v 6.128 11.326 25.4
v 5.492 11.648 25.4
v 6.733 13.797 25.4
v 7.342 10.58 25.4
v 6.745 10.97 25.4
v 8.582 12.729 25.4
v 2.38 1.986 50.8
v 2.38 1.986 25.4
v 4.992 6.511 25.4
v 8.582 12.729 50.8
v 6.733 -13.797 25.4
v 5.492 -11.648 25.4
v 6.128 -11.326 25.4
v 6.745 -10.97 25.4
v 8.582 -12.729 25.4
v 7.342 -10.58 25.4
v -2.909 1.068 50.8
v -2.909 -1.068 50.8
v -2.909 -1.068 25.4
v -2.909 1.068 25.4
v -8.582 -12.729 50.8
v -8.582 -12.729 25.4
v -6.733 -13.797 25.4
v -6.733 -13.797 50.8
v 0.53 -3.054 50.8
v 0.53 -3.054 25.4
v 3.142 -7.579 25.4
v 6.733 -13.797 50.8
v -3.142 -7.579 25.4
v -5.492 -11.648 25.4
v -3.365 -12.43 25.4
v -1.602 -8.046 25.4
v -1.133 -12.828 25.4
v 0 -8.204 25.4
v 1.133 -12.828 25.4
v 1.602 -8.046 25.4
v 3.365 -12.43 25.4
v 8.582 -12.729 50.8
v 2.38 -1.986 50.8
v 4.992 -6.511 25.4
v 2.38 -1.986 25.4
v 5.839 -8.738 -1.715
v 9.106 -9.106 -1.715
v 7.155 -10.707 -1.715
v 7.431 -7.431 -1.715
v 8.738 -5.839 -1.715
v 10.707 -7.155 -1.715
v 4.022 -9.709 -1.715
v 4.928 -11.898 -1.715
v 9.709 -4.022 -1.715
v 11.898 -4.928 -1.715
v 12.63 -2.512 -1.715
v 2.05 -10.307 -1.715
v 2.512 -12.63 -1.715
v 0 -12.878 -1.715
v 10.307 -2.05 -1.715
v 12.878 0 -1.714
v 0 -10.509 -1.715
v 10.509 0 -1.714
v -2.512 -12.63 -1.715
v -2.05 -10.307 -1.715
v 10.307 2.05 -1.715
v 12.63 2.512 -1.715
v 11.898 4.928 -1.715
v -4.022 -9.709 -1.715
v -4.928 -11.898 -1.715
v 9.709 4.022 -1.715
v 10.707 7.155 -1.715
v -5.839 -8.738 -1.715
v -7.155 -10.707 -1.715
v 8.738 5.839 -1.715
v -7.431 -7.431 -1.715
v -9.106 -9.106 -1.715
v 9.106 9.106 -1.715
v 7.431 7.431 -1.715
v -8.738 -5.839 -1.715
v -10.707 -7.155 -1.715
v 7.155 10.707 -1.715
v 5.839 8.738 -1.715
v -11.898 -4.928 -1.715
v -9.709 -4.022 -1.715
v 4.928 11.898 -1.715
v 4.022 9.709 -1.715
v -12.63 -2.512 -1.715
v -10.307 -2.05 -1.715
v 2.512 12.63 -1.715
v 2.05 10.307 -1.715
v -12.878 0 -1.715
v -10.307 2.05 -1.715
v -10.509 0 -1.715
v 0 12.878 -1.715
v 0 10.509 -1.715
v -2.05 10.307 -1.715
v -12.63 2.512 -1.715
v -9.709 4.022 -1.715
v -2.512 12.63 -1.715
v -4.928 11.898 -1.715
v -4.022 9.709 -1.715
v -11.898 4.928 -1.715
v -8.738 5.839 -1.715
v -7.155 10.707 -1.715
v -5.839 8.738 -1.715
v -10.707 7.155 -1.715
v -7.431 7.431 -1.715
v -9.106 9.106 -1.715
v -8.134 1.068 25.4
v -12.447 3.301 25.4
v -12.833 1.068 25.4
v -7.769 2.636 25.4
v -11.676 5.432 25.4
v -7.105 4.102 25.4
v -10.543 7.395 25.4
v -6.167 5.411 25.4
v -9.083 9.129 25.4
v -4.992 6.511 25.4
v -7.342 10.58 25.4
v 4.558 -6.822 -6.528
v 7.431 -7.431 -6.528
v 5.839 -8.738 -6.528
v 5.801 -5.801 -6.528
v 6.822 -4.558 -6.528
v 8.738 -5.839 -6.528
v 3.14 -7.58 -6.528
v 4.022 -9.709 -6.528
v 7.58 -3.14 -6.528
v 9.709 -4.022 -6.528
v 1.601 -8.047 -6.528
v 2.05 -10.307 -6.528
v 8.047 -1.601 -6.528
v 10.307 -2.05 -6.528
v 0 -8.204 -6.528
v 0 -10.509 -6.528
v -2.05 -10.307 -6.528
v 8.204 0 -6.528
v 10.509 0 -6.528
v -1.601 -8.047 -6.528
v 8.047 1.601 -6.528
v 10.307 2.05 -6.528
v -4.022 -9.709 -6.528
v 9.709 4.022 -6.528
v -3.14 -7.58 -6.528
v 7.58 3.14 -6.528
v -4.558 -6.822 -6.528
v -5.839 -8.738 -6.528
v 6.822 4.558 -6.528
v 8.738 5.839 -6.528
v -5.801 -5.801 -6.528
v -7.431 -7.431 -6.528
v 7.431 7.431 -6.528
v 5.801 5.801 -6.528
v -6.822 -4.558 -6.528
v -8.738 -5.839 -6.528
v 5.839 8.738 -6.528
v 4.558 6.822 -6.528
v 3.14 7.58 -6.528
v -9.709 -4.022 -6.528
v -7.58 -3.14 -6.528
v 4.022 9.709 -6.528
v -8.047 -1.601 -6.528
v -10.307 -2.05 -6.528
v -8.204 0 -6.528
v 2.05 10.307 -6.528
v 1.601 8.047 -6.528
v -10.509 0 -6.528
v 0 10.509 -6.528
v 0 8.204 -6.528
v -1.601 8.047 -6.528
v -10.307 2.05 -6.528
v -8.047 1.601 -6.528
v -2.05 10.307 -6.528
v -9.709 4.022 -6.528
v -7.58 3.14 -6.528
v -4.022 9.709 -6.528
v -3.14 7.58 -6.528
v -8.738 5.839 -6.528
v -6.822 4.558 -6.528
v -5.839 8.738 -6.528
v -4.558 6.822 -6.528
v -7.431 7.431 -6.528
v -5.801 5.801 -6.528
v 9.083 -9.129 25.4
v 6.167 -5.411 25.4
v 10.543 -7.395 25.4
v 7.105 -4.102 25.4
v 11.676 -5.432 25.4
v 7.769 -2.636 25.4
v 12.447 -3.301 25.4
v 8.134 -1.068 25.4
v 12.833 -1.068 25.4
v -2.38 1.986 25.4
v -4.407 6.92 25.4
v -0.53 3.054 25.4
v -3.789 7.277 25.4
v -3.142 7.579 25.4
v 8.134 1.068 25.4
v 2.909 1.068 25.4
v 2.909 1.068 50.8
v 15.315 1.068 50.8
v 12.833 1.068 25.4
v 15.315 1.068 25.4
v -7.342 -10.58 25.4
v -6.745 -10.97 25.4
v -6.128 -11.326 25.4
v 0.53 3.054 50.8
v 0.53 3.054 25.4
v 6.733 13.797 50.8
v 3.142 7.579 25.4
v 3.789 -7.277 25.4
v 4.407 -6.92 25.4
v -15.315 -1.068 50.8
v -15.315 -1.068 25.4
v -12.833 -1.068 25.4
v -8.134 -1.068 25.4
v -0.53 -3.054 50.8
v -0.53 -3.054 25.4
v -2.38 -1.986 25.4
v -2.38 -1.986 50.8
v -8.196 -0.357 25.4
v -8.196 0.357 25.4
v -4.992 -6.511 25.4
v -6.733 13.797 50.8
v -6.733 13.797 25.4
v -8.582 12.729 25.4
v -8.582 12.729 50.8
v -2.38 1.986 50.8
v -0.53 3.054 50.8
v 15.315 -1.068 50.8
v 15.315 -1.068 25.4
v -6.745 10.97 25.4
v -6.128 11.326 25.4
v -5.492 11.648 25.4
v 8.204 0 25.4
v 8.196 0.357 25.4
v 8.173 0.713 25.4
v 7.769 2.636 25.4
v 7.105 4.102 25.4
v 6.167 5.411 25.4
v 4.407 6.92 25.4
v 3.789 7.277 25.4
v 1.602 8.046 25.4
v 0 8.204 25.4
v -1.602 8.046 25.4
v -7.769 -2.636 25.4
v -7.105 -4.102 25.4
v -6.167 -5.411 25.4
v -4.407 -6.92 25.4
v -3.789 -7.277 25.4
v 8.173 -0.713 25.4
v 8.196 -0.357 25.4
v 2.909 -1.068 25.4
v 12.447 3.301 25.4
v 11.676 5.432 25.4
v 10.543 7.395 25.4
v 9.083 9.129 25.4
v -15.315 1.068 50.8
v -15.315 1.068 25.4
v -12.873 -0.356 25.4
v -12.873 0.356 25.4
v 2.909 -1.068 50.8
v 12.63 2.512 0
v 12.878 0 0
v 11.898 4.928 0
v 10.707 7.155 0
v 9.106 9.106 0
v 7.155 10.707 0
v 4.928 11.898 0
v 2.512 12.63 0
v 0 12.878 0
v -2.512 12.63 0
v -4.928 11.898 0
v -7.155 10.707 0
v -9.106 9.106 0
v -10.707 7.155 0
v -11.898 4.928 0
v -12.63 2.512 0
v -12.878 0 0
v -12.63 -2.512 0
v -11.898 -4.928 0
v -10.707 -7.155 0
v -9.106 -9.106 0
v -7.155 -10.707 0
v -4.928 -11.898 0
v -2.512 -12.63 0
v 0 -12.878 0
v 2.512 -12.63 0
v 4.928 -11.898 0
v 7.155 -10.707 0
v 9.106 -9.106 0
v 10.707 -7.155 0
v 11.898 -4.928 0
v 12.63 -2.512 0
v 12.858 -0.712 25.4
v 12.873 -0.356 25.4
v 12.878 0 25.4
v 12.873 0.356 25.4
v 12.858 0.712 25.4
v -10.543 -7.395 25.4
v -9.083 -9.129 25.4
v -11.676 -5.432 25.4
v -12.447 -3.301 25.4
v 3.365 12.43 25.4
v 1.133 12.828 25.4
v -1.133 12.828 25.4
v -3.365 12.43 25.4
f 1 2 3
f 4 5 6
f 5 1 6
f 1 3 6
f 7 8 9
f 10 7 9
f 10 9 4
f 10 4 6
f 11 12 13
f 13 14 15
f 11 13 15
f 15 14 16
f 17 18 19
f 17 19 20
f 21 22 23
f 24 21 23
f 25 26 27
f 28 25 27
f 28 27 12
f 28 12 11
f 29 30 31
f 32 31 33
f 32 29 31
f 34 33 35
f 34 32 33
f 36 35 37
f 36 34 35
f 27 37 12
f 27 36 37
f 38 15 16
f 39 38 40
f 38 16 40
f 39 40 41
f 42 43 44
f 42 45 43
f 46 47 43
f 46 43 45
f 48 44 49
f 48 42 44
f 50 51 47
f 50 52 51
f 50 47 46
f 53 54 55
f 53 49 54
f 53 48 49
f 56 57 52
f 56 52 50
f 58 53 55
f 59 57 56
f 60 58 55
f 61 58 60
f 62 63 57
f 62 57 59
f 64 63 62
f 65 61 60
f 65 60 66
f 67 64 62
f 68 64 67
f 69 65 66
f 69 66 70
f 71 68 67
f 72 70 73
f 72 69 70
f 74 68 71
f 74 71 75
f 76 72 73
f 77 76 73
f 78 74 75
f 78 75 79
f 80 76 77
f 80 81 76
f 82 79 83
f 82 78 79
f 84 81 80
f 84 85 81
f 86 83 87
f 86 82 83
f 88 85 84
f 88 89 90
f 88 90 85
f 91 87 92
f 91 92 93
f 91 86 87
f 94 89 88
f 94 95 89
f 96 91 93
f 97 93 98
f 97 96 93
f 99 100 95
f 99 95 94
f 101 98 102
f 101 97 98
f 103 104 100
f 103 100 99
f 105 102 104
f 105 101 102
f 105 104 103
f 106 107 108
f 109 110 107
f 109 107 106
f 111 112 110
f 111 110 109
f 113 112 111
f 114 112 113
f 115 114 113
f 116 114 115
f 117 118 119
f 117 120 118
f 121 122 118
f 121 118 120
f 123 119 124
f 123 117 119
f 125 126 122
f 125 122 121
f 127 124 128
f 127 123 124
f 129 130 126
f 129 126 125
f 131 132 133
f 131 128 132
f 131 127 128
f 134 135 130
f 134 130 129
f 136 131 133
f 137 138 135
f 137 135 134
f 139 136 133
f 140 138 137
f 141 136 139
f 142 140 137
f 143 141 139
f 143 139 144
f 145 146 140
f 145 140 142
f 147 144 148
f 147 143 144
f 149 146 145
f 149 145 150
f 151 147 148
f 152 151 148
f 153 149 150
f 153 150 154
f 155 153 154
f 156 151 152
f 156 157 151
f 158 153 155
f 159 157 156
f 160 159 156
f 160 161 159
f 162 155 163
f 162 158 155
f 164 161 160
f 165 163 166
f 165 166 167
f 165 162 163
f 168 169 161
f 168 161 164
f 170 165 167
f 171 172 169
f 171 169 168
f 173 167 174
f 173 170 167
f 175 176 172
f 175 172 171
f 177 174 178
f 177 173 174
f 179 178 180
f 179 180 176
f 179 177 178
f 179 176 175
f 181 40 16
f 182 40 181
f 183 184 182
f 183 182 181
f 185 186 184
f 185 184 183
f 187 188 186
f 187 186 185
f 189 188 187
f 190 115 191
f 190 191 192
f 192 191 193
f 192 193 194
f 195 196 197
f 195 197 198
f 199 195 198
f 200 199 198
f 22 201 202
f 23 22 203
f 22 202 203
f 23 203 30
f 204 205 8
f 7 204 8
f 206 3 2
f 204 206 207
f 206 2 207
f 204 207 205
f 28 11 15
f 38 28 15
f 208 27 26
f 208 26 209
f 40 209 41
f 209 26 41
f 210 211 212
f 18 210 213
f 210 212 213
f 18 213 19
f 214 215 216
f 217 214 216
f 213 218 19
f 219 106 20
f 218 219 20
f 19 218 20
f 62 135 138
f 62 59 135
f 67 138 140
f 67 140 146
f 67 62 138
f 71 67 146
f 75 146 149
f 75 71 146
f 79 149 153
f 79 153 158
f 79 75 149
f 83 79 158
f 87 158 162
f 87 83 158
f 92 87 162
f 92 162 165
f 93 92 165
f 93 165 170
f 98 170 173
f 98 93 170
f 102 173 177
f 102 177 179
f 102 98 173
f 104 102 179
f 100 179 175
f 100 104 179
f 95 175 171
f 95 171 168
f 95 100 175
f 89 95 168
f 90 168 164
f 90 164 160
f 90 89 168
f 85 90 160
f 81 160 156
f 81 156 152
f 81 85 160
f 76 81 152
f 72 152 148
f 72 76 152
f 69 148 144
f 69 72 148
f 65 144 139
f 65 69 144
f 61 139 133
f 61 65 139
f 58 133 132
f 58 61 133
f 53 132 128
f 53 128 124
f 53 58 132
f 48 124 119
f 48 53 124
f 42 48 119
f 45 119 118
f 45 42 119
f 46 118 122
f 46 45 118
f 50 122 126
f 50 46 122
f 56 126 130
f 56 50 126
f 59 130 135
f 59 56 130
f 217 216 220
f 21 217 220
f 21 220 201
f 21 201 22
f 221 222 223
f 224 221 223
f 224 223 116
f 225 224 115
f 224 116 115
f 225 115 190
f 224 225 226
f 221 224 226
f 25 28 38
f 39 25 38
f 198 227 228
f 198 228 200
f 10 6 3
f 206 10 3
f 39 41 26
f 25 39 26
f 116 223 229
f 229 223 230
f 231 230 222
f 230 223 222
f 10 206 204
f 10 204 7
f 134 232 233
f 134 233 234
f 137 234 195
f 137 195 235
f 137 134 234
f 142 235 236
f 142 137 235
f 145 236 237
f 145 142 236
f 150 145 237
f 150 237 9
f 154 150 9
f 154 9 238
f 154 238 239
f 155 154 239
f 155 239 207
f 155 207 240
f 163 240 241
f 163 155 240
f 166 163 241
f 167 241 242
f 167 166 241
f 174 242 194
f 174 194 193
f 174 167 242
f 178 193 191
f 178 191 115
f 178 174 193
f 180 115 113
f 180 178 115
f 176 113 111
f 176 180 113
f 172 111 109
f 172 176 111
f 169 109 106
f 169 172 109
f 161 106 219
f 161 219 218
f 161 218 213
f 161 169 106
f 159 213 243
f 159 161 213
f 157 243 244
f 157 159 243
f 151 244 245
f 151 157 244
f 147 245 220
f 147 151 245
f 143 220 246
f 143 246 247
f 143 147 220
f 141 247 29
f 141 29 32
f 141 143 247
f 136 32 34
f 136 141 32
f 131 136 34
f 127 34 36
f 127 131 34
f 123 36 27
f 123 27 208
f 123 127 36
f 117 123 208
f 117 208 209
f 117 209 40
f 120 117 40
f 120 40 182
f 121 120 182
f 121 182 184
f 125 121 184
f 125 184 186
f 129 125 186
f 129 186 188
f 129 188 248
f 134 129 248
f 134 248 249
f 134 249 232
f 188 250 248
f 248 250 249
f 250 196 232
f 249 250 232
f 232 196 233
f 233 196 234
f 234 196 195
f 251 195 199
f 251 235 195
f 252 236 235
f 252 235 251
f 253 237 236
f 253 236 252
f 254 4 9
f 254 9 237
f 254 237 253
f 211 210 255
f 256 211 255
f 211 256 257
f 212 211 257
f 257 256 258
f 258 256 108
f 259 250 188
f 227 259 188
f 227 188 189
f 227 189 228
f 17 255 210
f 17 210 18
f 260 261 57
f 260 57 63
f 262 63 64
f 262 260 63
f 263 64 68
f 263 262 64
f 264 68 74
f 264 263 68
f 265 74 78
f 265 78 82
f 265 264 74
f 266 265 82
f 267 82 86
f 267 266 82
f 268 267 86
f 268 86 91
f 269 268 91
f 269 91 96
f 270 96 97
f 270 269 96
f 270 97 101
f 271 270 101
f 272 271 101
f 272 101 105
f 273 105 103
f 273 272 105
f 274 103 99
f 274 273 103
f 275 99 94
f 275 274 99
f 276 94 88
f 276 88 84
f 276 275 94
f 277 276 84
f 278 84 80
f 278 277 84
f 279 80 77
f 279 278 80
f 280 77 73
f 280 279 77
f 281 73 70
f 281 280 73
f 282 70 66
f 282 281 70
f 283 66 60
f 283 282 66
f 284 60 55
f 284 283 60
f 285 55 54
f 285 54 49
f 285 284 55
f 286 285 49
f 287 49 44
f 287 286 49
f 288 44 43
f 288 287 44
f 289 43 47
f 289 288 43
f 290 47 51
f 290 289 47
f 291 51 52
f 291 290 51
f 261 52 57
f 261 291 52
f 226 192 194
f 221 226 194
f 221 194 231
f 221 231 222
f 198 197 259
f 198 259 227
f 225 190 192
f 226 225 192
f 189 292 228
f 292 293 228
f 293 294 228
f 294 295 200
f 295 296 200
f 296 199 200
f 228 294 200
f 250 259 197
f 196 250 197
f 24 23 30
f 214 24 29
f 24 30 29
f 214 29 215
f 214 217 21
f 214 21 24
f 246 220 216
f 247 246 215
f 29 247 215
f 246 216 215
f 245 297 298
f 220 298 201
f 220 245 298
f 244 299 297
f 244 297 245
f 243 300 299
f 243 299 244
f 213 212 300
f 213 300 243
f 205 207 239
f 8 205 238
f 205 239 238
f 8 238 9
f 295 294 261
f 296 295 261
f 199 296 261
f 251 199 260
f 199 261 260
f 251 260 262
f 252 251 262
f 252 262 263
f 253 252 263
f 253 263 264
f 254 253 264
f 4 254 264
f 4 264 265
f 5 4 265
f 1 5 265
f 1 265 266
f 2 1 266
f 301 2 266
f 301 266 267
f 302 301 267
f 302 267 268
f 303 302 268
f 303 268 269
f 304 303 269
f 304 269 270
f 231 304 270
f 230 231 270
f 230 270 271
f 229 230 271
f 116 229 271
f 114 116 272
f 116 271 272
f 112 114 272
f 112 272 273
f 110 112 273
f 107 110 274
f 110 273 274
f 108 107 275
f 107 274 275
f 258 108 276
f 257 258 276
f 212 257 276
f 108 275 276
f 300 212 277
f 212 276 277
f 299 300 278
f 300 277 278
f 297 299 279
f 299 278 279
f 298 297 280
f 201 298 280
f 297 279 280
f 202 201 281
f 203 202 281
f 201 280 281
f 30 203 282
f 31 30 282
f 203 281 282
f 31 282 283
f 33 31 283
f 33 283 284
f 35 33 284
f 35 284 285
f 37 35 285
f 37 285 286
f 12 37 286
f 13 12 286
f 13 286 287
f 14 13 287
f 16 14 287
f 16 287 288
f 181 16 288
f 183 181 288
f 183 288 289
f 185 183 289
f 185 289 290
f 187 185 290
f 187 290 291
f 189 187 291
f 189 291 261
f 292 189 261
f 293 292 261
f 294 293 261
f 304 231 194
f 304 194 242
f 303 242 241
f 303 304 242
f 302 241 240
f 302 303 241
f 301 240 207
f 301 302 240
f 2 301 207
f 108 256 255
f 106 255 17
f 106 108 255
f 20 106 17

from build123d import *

# Parameters (mm, degrees)
F2_FACE_R   = 12.8778
F2_FACE_R_2 = 8.2042
F3_DEPTH    = 25.4
F4_W        = 12.40562
F4_H        = 2.135868
F5_DEPTH    = 25.4


with BuildPart() as f2:
    # F1 (on Front) → F2 (revolve)
    with BuildSketch(Plane.XZ):
        Polygon((12.8778, 0), (8.2042, 0), (8.2042, -6.5278), (10.50925, -6.5278), (10.50925, -1.7145), (12.8778, -1.7145), align=None)
    revolve(axis=Axis((0, 0, 18.280845), (0, 0, 1)))

    # F2_face (on face) → F3 (join)
    with BuildSketch(Plane.XY):
        Circle(F2_FACE_R)
        Circle(F2_FACE_R_2, mode=Mode.SUBTRACT)
    extrude(amount=F3_DEPTH)

    # F4 (on face) → F5 (join)
    with BuildSketch(Plane.XY.offset(25.4)):
        with Locations((9.112263, 0)):
            Rectangle(F4_W, F4_H)
        Polygon((6.732679, 13.797209), (0.529869, 3.053627), (2.379584, 1.985693), (8.582394, 12.729275), align=None)
        Polygon((-8.582394, 12.729275), (-2.379584, 1.985693), (-0.529869, 3.053627), (-6.732679, 13.797209), align=None)
        with Locations((-9.112263, 0)):
            Rectangle(F4_W, F4_H)
        Polygon((-6.732679, -13.797209), (-0.529869, -3.053627), (-2.379584, -1.985693), (-8.582394, -12.729275), align=None)
        Polygon((8.582394, -12.729275), (2.379584, -1.985693), (0.529869, -3.053627), (6.732679, -13.797209), align=None)
    extrude(amount=F5_DEPTH)


solid = f2.part
